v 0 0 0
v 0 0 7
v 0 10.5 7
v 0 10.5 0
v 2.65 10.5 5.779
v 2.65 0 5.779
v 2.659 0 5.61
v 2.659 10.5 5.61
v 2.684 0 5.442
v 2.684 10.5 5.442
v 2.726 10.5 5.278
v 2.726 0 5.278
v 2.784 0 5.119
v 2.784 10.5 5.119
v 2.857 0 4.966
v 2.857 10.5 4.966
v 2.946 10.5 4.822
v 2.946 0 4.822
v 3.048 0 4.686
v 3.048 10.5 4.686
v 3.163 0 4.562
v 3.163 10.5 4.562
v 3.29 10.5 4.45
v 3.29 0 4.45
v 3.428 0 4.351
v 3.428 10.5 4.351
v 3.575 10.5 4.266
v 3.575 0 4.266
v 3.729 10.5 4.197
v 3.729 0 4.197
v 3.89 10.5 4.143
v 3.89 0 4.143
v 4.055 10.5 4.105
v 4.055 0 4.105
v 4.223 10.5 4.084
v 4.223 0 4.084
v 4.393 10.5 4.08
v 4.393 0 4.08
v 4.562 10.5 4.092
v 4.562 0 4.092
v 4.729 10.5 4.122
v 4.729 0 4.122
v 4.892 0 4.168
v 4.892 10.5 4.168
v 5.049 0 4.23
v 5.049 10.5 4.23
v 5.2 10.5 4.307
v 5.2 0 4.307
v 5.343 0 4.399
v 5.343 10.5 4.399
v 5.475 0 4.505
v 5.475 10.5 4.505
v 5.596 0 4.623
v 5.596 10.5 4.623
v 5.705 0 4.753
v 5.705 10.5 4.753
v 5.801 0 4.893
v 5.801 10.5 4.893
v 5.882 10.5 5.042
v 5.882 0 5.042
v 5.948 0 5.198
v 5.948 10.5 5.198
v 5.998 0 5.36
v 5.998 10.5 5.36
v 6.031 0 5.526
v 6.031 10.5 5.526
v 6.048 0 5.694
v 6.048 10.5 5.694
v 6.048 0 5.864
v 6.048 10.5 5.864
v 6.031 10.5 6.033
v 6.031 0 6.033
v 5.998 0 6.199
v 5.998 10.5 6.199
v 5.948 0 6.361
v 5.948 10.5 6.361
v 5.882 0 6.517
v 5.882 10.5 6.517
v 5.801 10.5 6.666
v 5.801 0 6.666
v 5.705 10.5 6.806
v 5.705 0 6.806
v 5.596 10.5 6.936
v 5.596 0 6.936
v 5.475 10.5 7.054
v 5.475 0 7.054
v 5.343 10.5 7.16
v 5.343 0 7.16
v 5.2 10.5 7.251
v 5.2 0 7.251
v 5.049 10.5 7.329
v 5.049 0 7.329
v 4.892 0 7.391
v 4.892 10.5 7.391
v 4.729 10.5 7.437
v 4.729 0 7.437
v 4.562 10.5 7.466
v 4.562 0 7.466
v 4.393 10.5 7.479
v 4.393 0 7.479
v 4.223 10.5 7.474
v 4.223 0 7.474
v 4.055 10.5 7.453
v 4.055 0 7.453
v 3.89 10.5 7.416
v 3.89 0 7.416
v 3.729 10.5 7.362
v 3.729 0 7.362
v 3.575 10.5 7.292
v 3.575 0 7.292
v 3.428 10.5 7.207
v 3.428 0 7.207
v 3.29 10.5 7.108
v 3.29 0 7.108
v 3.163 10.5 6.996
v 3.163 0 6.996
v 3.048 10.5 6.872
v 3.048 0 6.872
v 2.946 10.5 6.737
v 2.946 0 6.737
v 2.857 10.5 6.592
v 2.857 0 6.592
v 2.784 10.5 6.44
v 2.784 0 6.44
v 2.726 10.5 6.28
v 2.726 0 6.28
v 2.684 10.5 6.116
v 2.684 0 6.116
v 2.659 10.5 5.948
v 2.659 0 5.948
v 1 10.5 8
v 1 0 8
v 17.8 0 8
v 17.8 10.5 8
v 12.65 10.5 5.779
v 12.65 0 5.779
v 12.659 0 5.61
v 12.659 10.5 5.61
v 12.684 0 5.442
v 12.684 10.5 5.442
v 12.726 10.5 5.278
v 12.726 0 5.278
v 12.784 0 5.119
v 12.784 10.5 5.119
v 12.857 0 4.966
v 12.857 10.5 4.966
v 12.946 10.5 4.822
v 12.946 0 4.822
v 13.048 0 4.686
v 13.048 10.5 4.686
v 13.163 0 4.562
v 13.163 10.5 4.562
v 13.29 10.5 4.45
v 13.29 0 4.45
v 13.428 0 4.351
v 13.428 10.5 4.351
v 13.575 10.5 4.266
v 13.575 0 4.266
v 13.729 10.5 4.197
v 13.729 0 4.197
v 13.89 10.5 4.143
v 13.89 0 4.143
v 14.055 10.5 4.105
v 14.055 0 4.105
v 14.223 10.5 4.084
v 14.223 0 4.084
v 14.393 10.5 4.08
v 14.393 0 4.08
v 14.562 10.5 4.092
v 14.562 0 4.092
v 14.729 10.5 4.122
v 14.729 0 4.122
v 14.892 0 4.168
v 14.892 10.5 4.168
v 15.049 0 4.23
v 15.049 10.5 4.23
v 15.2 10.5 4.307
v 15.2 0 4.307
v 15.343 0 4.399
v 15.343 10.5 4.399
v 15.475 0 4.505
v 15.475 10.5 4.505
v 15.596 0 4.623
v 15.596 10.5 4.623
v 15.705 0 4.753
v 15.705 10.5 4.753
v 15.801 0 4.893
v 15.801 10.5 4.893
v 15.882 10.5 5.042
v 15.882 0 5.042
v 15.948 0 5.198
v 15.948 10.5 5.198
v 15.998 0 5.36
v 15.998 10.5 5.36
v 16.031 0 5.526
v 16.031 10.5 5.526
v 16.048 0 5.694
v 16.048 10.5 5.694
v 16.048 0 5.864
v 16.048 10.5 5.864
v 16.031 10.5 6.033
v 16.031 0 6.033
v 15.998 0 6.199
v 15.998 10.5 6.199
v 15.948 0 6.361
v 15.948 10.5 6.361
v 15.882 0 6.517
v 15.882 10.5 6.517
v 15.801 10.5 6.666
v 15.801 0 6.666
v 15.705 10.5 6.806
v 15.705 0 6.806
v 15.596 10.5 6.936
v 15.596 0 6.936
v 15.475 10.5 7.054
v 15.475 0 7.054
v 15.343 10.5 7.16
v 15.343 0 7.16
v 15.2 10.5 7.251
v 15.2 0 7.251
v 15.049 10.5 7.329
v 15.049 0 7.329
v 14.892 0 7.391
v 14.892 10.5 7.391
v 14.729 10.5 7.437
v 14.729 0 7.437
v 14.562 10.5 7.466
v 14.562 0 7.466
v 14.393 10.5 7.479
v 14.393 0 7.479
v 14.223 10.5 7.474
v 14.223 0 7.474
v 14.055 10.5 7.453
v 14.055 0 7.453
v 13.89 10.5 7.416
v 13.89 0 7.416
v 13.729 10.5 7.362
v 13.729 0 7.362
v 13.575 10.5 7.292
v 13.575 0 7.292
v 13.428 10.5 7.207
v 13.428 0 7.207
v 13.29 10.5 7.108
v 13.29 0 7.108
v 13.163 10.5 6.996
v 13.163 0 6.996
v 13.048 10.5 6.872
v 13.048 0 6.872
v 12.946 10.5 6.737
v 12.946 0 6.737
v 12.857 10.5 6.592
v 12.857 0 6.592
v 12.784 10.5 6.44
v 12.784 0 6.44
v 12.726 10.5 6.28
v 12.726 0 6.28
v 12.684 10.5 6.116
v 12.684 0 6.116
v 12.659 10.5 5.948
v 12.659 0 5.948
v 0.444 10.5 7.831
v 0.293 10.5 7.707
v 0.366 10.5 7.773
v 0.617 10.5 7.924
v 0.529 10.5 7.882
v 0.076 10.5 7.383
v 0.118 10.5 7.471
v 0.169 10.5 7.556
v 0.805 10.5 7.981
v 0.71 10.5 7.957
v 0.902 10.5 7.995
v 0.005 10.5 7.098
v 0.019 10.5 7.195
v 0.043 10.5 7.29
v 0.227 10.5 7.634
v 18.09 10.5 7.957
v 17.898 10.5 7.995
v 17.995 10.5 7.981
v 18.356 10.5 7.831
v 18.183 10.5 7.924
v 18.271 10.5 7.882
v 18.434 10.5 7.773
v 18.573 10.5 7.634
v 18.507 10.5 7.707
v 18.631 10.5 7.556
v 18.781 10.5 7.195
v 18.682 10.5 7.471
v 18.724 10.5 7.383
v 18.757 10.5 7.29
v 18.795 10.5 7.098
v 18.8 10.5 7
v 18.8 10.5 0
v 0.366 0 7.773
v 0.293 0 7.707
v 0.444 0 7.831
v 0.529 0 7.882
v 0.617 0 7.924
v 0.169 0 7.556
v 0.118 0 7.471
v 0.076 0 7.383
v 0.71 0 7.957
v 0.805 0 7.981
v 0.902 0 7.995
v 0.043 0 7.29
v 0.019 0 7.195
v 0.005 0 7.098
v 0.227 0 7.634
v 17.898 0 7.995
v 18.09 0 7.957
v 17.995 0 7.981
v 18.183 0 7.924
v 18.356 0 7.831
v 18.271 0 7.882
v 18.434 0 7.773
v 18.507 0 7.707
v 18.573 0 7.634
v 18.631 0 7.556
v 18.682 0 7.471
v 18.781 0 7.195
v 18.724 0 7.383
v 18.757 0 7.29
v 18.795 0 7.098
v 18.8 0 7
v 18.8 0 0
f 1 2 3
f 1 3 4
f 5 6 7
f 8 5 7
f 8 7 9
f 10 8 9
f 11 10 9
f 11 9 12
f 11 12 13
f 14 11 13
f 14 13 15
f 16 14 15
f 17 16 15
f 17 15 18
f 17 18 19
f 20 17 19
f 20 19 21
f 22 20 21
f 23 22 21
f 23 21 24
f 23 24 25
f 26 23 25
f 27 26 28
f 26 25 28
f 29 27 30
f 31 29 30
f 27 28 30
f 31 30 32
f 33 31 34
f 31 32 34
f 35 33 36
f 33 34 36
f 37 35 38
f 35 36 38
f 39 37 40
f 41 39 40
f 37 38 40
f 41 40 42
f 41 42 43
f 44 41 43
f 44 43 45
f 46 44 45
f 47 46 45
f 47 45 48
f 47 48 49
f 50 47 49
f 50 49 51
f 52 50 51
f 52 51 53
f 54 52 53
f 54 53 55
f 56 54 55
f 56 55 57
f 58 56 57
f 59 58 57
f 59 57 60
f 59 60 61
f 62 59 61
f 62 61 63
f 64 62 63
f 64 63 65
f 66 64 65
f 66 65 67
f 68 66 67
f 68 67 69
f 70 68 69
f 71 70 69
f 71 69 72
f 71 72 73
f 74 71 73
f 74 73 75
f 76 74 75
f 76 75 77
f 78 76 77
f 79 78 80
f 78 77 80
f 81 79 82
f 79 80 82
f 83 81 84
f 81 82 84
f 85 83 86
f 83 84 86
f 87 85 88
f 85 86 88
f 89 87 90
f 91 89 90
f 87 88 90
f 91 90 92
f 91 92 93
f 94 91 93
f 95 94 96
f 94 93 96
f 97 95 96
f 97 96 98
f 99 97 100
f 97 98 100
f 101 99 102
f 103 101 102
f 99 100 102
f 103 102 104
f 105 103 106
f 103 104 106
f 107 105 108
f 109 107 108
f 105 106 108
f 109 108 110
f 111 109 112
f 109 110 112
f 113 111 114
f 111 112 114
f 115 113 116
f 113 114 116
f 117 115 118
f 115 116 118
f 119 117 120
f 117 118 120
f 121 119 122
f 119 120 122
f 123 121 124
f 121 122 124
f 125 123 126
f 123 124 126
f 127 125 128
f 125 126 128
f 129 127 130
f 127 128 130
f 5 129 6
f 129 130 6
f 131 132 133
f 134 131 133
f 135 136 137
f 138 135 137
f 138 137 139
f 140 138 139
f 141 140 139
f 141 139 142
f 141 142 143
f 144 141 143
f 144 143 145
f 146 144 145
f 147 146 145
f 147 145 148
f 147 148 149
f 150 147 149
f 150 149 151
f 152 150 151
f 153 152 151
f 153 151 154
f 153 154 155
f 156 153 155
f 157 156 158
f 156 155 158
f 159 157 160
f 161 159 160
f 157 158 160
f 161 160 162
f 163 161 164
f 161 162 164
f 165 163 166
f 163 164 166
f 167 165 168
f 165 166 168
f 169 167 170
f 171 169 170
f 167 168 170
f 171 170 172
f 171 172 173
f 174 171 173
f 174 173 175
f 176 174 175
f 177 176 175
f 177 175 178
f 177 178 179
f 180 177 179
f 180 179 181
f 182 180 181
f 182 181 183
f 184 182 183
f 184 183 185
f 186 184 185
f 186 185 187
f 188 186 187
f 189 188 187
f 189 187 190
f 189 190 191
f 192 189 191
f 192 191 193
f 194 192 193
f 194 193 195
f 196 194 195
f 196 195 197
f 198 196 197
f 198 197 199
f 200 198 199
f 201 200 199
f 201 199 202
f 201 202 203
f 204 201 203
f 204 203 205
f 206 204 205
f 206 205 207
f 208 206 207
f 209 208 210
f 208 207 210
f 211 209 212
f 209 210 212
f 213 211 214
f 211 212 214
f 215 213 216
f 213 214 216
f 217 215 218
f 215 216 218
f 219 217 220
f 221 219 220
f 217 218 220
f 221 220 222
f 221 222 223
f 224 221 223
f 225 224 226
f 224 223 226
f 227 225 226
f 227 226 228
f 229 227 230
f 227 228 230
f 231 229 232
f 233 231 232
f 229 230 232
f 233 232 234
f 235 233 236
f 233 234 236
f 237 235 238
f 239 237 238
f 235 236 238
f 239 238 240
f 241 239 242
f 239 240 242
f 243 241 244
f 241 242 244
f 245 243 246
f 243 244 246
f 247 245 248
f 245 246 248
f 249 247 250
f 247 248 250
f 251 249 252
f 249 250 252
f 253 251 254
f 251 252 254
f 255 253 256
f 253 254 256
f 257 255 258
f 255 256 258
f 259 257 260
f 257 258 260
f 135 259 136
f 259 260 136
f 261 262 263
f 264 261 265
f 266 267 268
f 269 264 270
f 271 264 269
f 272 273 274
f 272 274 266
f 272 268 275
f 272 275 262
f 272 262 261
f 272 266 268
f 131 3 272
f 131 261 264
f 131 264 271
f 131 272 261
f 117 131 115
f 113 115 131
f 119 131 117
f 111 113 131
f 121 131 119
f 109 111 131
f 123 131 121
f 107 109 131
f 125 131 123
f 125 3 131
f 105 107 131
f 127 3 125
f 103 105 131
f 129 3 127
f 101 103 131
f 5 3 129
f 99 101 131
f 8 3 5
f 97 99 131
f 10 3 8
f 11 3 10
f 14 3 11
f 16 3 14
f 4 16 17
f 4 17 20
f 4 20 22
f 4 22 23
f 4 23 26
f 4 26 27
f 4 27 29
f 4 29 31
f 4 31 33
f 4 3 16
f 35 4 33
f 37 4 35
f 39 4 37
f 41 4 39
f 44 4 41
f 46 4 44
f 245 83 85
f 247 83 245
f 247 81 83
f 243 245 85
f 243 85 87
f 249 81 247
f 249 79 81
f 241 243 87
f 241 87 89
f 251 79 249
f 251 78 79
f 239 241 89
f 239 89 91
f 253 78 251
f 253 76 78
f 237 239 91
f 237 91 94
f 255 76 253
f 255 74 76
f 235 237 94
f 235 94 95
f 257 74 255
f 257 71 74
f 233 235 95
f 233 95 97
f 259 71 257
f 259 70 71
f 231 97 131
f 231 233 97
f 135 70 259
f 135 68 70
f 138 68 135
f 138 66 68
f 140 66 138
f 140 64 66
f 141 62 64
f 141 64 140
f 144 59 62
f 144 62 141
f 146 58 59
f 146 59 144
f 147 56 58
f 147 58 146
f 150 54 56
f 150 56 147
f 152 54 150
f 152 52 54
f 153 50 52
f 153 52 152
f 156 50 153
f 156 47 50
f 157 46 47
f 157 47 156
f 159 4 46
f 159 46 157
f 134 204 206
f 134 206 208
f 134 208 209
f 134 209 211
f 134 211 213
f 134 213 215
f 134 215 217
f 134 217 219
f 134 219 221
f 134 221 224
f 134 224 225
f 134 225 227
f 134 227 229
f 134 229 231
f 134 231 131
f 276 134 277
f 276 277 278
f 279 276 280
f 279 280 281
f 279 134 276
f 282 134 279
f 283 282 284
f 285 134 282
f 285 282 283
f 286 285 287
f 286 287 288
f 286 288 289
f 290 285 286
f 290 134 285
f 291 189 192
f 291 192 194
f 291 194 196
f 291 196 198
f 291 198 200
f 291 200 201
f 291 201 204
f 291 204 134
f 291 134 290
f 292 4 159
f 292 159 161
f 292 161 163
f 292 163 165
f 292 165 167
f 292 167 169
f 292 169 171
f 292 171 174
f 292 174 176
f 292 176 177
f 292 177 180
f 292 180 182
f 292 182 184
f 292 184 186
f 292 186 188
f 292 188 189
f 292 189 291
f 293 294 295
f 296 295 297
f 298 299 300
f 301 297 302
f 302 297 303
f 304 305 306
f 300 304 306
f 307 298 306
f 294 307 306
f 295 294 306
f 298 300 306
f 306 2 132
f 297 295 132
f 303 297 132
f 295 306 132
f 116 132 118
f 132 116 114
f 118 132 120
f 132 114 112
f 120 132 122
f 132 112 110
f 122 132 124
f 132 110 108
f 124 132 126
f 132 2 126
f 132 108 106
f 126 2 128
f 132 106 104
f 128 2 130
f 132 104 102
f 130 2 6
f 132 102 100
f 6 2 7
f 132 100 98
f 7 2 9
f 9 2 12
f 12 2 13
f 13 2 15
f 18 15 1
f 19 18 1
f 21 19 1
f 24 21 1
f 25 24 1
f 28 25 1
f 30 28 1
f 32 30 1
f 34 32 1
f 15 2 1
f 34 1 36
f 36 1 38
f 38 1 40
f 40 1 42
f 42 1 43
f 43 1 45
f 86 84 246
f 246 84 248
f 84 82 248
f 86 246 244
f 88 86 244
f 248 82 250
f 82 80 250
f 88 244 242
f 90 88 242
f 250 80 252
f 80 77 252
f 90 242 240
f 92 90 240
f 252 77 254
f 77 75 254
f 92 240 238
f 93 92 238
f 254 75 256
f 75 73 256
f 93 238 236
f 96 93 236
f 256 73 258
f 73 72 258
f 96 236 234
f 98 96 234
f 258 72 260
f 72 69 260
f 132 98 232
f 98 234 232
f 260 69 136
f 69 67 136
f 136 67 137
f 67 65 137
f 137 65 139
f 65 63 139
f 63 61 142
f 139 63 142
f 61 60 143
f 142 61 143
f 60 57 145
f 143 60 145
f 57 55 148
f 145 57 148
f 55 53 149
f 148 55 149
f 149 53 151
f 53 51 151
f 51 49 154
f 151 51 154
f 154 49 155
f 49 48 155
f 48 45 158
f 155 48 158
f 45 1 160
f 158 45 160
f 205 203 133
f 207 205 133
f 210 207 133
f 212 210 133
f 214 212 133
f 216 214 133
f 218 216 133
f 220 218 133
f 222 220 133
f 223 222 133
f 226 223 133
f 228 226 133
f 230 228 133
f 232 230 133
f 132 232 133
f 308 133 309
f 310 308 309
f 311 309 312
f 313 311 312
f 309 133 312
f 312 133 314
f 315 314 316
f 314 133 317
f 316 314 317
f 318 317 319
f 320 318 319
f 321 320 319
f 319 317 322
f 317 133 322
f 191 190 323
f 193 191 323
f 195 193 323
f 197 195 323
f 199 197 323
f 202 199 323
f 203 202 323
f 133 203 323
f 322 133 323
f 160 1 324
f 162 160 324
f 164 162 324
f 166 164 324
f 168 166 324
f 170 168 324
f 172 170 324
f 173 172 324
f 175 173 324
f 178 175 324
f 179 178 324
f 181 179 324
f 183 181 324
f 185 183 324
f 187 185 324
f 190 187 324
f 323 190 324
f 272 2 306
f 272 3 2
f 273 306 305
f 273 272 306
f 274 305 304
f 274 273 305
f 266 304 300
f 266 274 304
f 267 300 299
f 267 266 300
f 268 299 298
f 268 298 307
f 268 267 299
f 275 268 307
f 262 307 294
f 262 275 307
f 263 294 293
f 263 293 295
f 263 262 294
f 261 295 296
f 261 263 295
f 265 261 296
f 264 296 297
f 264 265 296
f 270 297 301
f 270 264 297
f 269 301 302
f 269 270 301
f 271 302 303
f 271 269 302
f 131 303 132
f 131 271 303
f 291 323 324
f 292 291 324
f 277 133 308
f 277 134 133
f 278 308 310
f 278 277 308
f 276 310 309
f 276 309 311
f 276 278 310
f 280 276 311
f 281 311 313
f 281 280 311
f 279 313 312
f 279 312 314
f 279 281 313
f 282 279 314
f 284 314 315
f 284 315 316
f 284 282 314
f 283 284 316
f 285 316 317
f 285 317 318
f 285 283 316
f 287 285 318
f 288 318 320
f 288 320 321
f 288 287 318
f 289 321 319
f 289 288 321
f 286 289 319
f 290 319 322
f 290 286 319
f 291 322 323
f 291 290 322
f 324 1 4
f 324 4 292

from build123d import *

# Parameters (mm, degrees)
SKETCH_1_W        = 18.8
SKETCH_1_H        = 8
EXTRUDE_1_DEPTH   = 10.5
FILLET_1_R        = 1
HOLE_WIZARD_M31_D = 3.4


with BuildPart() as part:
    # Эскиз1 → Бобышка-Вытянуть1 (new body)
    with BuildSketch(Plane(origin=(0, 0, 0), x_dir=(1, 0, 0), z_dir=(0, 1, 0))):
        with Locations((9.4, -4)):
            Rectangle(SKETCH_1_W, SKETCH_1_H)
    extrude(amount=EXTRUDE_1_DEPTH)

    # Скругление1
    fillet_1_edges = [part.edges().sort_by_distance(p)[0] for p in [
        (18.8, 5.25, 8),
        (0, 5.25, 8),
    ]]
    fillet(fillet_1_edges, radius=FILLET_1_R)

    # Отверстие с зазором M31 (through all)
    with Locations(Plane(origin=(0, 10.5, 0), x_dir=(1, 0, 0), z_dir=(0, 1, 0))):
        with Locations((4.350247301, -5.779226371), (14.350247301, -5.779226371)):
            Hole(HOLE_WIZARD_M31_D / 2)


solid = part.part
